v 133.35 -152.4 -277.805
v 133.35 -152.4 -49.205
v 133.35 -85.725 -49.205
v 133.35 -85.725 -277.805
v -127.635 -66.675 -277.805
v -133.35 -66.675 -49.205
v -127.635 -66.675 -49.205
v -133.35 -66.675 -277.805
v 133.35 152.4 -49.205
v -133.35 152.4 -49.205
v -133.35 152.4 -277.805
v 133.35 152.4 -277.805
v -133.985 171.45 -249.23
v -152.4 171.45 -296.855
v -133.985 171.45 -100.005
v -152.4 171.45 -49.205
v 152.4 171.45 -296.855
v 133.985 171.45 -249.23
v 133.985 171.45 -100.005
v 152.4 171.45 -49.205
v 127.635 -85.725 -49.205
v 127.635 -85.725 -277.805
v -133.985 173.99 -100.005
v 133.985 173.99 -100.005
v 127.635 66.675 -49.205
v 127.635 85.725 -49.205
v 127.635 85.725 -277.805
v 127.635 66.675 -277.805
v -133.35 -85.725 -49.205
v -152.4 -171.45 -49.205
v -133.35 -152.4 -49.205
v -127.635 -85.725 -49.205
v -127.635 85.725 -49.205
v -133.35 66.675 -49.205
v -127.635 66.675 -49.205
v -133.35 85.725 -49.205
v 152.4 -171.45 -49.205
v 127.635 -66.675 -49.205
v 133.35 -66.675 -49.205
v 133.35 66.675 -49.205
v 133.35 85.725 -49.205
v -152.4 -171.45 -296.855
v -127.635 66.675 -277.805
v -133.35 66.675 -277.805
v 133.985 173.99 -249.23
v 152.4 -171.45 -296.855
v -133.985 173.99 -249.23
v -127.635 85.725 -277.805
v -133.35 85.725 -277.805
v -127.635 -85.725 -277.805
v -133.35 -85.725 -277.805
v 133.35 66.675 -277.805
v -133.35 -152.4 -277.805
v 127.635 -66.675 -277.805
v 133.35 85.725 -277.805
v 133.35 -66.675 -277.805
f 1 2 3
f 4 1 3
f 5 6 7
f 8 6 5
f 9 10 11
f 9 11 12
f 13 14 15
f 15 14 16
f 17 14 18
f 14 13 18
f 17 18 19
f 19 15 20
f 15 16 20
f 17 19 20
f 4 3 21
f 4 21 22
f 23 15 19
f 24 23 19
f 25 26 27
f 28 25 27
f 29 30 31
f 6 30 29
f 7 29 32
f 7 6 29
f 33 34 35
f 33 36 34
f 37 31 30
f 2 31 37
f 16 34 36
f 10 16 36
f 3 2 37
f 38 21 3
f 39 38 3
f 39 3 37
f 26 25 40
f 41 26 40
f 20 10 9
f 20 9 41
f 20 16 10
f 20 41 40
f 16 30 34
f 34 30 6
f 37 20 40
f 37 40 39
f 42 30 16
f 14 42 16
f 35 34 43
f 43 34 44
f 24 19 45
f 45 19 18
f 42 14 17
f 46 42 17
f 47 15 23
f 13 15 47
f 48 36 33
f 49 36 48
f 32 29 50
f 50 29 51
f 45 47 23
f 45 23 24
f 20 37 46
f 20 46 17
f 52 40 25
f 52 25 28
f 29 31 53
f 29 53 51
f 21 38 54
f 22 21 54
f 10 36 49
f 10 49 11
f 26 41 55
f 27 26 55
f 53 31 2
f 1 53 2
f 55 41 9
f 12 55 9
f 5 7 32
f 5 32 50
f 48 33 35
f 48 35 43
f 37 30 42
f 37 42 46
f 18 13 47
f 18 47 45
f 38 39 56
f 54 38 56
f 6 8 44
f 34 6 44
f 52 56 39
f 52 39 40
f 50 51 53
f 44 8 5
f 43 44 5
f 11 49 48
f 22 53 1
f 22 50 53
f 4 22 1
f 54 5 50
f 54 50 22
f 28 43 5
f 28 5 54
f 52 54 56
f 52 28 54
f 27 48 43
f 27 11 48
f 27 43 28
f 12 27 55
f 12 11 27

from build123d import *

# Parameters (mm, degrees)
SKETCH1_W           = 406.4
SKETCH1_H           = 457.2
BOSS_EXTRUDE1_DEPTH = 330.2
SHELL1_T            = -25.4
SKETCH2_W           = 304.8
SKETCH2_H           = 25.4
BOSS_EXTRUDE2_DEPTH = 7.62
SCALE1_SCALE        = 0.75
SKETCH3_W           = 267.97
SKETCH3_H           = 149.225
BOSS_EXTRUDE3_DEPTH = 2.54


with BuildPart() as part:
    # Sketch1 → Boss-Extrude1 (new body)
    with BuildSketch(Plane.XY):
        Rectangle(SKETCH1_W, SKETCH1_H)
    extrude(amount=-BOSS_EXTRUDE1_DEPTH)

    # Shell1
    shell1_openings = [part.faces().sort_by_distance(p)[0] for p in [
        (0, 0, 0),
    ]]
    offset(amount=SHELL1_T, openings=shell1_openings, kind=Kind.INTERSECTION)

    # Sketch2 → Boss-Extrude2 (add)
    with BuildSketch(Plane(origin=(-177.8, 0, 0), x_dir=(0, 0, -1), z_dir=(1, 0, 0))):
        with Locations((152.4, -101.6)):
            Rectangle(SKETCH2_W, SKETCH2_H)
        with Locations((152.4, 101.6)):
            Rectangle(SKETCH2_W, SKETCH2_H)
    boss_extrude2 = extrude(amount=BOSS_EXTRUDE2_DEPTH)

    # Mirror1: Boss-Extrude2 across plane
    add(boss_extrude2.mirror(Plane(origin=(0, 0, 0), x_dir=(0, 0, 1), z_dir=(1, 0, 0))))


with BuildPart() as part_1:
    # Scale1: scaled about (0, 0, -196.821524664)
    add(part.part.scale(SCALE1_SCALE).moved(Location((0, 0, -49.205381166))))

    # Sketch3 → Boss-Extrude3 (add)
    with BuildSketch(Plane(origin=(0, 171.45, 0), x_dir=(1, 0, 0), z_dir=(0, 1, 0))):
        with Locations((0, 174.617881166)):
            Rectangle(SKETCH3_W, SKETCH3_H)
    extrude(amount=BOSS_EXTRUDE3_DEPTH)


solid = part_1.part
